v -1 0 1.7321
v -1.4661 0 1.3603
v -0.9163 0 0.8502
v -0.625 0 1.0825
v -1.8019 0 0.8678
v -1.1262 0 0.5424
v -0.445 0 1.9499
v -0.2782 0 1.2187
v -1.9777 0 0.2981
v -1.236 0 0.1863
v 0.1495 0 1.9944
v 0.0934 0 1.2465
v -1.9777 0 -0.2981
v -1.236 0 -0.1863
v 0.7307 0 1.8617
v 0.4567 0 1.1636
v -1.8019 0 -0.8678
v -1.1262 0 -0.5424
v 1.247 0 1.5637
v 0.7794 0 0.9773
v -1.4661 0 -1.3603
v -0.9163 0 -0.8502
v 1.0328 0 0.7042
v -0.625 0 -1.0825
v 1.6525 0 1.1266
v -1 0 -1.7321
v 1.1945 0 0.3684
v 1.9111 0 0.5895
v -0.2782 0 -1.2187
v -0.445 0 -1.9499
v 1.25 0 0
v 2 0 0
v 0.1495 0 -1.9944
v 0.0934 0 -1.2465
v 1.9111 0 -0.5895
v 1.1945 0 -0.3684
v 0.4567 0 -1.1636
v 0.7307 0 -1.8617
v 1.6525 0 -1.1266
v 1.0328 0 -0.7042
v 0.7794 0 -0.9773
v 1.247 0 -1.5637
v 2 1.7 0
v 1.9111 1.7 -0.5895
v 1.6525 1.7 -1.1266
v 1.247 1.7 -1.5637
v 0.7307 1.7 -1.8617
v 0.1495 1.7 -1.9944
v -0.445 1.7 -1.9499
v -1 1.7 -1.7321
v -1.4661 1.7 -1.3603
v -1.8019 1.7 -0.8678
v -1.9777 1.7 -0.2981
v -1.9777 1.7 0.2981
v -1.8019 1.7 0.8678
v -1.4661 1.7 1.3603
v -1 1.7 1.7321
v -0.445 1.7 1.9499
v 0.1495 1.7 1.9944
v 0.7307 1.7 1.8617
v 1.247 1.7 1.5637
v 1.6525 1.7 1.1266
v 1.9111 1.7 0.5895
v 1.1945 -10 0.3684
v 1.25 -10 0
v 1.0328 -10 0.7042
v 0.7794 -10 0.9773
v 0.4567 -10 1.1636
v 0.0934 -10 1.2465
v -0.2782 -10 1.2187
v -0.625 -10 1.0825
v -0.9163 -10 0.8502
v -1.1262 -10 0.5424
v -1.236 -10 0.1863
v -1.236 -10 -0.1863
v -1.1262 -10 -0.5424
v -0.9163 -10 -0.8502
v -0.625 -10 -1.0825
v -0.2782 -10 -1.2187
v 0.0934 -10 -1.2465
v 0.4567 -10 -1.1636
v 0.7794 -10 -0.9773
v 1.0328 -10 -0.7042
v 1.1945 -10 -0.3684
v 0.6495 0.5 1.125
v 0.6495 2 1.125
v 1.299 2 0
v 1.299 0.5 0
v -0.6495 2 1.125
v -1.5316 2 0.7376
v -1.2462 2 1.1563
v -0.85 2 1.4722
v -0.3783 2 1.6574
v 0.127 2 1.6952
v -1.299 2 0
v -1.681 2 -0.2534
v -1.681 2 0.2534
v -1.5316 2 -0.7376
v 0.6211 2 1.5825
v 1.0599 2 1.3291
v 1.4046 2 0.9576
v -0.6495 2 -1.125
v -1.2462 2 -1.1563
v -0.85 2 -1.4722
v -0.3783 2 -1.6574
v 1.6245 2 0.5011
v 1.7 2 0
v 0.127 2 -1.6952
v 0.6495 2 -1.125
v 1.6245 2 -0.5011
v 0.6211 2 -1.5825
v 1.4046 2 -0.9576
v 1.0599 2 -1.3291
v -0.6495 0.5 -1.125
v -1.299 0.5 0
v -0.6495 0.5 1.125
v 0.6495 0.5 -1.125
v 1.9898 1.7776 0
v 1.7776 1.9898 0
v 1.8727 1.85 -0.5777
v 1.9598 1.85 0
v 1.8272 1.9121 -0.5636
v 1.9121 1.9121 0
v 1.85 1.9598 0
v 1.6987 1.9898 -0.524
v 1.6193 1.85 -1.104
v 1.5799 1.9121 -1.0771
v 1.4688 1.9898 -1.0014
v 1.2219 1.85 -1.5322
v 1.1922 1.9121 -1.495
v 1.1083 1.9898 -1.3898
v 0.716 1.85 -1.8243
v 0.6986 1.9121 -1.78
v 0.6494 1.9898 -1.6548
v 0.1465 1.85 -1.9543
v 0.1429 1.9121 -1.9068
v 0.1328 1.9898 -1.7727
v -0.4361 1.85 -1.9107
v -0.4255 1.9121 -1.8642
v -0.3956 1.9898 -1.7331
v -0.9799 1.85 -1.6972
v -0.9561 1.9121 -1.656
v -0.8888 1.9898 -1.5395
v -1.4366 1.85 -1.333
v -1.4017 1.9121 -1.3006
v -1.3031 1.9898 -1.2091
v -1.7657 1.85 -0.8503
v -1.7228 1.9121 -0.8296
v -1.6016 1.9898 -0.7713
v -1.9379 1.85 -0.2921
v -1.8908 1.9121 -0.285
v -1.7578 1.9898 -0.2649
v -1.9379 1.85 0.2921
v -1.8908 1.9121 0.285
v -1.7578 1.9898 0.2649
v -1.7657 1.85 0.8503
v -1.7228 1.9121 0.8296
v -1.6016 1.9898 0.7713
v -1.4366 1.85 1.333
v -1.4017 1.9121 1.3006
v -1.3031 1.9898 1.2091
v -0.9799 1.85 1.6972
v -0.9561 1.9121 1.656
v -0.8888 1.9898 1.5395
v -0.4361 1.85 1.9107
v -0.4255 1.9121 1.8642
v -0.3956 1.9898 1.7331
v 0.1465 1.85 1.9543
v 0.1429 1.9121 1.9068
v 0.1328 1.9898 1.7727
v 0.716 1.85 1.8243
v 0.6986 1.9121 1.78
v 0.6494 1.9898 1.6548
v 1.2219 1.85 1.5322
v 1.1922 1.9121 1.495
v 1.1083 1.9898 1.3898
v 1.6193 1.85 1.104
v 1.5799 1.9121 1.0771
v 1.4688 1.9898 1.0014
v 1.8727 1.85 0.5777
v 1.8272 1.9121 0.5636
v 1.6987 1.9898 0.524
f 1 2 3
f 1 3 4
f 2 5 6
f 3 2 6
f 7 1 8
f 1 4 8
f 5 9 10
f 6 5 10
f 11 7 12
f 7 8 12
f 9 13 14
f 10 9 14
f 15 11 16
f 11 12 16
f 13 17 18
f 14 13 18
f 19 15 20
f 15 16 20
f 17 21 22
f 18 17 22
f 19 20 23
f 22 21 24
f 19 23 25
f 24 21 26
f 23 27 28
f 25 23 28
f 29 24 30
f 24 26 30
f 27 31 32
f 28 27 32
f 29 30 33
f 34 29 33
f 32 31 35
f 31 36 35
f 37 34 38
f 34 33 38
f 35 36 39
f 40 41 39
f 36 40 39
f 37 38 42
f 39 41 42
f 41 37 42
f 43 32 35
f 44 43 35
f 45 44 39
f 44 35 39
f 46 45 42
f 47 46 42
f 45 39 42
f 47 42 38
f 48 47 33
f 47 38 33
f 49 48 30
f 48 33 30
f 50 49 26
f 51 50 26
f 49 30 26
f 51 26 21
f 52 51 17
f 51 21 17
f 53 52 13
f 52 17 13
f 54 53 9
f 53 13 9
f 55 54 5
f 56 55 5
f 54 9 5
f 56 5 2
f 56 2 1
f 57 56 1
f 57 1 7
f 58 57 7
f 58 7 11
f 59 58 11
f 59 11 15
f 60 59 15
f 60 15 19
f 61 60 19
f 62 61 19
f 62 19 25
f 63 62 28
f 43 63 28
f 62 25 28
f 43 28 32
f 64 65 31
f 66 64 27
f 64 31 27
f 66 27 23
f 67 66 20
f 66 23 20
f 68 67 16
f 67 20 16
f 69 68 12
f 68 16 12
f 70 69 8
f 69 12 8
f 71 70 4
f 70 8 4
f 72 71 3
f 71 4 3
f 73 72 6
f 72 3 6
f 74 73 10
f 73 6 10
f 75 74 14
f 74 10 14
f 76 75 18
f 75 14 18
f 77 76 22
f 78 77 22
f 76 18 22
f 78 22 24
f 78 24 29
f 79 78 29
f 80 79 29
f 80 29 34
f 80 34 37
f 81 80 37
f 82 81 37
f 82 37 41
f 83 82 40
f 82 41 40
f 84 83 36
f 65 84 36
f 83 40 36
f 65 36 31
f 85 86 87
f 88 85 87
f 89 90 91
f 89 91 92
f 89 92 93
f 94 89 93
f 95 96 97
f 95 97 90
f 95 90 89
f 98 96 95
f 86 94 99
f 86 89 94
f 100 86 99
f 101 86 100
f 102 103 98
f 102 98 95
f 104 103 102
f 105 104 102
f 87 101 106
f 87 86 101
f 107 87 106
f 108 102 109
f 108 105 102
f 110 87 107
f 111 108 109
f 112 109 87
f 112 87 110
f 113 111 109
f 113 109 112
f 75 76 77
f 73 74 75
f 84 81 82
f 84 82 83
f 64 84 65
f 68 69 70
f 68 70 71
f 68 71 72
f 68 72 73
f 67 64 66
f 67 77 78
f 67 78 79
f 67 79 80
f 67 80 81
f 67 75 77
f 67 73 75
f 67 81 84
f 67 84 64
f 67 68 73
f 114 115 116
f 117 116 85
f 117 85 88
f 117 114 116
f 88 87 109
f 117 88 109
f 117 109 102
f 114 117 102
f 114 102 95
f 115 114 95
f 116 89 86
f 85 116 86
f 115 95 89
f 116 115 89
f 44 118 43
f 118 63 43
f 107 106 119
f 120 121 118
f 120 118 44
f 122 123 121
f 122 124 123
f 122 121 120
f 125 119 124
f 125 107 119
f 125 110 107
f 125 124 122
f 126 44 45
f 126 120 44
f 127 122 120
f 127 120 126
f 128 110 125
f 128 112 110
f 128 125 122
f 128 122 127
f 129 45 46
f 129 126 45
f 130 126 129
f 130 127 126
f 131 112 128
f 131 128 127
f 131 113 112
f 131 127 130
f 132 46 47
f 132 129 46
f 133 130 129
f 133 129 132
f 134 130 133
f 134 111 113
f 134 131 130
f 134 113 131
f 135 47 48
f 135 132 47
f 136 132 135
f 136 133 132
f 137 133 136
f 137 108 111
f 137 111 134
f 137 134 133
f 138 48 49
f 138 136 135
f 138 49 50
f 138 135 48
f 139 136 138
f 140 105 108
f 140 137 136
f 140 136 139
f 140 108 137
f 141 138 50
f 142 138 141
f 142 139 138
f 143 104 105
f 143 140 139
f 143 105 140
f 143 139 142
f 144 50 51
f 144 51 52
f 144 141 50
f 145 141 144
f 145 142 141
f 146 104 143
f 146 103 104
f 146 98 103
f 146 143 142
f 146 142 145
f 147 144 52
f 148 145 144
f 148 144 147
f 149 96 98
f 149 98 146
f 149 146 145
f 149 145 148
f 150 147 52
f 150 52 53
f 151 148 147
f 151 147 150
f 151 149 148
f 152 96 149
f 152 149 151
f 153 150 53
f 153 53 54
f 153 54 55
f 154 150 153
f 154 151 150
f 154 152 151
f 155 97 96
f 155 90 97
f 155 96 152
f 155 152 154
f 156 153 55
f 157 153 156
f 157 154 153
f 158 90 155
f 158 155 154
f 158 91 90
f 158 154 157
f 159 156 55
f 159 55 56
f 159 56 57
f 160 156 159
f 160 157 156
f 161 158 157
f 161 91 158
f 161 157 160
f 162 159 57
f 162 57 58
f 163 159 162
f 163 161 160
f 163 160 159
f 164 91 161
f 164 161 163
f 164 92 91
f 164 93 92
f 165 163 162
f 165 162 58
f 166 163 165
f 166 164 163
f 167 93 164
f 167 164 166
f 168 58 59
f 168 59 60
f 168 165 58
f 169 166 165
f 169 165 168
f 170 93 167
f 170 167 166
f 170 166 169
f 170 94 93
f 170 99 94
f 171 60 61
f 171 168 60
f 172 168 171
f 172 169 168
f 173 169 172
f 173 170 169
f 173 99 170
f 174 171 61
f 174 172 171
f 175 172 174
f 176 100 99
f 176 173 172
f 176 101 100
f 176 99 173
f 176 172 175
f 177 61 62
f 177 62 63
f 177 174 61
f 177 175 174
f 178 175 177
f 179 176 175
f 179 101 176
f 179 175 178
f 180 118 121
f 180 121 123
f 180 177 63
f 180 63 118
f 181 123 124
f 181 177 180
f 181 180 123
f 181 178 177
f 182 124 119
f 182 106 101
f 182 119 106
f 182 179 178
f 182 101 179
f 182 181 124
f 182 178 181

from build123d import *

# Parameters (mm, degrees)
SKETCH1_R           = 2
BOSS_EXTRUDE1_DEPTH = 2
SKETCH2_R           = 1.25
BOSS_EXTRUDE2_DEPTH = 10
FILLET1_R           = 0.3
CUT_EXTRUDE1_DEPTH  = 1.5


with BuildPart() as part:
    # Sketch1 → Boss-Extrude1 (new body)
    with BuildSketch(Plane(origin=(0, 0, 0), x_dir=(1, 0, 0), z_dir=(0, 1, 0))):
        Circle(SKETCH1_R)
    extrude(amount=BOSS_EXTRUDE1_DEPTH)

    # Sketch2 → Boss-Extrude2 (add)
    with BuildSketch(Plane.XZ):
        Circle(SKETCH2_R)
    extrude(amount=BOSS_EXTRUDE2_DEPTH)

    # Fillet1
    fillet1_edges = [part.edges().sort_by_distance(p)[0] for p in [
        (-2, 2, 0),
    ]]
    fillet(fillet1_edges, radius=FILLET1_R)

    # Sketch4 → Cut-Extrude1 (cut)
    with BuildSketch(Plane(origin=(0, 2, 0), x_dir=(1, 0, 0), z_dir=(0, 1, 0))):
        Polygon((1.299038106, 0), (0.649519053, 1.125), (-0.649519053, 1.125), (-1.299038106, 0), (-0.649519053, -1.125), (0.649519053, -1.125), align=None)
    extrude(amount=-CUT_EXTRUDE1_DEPTH, mode=Mode.SUBTRACT)


solid = part.part
